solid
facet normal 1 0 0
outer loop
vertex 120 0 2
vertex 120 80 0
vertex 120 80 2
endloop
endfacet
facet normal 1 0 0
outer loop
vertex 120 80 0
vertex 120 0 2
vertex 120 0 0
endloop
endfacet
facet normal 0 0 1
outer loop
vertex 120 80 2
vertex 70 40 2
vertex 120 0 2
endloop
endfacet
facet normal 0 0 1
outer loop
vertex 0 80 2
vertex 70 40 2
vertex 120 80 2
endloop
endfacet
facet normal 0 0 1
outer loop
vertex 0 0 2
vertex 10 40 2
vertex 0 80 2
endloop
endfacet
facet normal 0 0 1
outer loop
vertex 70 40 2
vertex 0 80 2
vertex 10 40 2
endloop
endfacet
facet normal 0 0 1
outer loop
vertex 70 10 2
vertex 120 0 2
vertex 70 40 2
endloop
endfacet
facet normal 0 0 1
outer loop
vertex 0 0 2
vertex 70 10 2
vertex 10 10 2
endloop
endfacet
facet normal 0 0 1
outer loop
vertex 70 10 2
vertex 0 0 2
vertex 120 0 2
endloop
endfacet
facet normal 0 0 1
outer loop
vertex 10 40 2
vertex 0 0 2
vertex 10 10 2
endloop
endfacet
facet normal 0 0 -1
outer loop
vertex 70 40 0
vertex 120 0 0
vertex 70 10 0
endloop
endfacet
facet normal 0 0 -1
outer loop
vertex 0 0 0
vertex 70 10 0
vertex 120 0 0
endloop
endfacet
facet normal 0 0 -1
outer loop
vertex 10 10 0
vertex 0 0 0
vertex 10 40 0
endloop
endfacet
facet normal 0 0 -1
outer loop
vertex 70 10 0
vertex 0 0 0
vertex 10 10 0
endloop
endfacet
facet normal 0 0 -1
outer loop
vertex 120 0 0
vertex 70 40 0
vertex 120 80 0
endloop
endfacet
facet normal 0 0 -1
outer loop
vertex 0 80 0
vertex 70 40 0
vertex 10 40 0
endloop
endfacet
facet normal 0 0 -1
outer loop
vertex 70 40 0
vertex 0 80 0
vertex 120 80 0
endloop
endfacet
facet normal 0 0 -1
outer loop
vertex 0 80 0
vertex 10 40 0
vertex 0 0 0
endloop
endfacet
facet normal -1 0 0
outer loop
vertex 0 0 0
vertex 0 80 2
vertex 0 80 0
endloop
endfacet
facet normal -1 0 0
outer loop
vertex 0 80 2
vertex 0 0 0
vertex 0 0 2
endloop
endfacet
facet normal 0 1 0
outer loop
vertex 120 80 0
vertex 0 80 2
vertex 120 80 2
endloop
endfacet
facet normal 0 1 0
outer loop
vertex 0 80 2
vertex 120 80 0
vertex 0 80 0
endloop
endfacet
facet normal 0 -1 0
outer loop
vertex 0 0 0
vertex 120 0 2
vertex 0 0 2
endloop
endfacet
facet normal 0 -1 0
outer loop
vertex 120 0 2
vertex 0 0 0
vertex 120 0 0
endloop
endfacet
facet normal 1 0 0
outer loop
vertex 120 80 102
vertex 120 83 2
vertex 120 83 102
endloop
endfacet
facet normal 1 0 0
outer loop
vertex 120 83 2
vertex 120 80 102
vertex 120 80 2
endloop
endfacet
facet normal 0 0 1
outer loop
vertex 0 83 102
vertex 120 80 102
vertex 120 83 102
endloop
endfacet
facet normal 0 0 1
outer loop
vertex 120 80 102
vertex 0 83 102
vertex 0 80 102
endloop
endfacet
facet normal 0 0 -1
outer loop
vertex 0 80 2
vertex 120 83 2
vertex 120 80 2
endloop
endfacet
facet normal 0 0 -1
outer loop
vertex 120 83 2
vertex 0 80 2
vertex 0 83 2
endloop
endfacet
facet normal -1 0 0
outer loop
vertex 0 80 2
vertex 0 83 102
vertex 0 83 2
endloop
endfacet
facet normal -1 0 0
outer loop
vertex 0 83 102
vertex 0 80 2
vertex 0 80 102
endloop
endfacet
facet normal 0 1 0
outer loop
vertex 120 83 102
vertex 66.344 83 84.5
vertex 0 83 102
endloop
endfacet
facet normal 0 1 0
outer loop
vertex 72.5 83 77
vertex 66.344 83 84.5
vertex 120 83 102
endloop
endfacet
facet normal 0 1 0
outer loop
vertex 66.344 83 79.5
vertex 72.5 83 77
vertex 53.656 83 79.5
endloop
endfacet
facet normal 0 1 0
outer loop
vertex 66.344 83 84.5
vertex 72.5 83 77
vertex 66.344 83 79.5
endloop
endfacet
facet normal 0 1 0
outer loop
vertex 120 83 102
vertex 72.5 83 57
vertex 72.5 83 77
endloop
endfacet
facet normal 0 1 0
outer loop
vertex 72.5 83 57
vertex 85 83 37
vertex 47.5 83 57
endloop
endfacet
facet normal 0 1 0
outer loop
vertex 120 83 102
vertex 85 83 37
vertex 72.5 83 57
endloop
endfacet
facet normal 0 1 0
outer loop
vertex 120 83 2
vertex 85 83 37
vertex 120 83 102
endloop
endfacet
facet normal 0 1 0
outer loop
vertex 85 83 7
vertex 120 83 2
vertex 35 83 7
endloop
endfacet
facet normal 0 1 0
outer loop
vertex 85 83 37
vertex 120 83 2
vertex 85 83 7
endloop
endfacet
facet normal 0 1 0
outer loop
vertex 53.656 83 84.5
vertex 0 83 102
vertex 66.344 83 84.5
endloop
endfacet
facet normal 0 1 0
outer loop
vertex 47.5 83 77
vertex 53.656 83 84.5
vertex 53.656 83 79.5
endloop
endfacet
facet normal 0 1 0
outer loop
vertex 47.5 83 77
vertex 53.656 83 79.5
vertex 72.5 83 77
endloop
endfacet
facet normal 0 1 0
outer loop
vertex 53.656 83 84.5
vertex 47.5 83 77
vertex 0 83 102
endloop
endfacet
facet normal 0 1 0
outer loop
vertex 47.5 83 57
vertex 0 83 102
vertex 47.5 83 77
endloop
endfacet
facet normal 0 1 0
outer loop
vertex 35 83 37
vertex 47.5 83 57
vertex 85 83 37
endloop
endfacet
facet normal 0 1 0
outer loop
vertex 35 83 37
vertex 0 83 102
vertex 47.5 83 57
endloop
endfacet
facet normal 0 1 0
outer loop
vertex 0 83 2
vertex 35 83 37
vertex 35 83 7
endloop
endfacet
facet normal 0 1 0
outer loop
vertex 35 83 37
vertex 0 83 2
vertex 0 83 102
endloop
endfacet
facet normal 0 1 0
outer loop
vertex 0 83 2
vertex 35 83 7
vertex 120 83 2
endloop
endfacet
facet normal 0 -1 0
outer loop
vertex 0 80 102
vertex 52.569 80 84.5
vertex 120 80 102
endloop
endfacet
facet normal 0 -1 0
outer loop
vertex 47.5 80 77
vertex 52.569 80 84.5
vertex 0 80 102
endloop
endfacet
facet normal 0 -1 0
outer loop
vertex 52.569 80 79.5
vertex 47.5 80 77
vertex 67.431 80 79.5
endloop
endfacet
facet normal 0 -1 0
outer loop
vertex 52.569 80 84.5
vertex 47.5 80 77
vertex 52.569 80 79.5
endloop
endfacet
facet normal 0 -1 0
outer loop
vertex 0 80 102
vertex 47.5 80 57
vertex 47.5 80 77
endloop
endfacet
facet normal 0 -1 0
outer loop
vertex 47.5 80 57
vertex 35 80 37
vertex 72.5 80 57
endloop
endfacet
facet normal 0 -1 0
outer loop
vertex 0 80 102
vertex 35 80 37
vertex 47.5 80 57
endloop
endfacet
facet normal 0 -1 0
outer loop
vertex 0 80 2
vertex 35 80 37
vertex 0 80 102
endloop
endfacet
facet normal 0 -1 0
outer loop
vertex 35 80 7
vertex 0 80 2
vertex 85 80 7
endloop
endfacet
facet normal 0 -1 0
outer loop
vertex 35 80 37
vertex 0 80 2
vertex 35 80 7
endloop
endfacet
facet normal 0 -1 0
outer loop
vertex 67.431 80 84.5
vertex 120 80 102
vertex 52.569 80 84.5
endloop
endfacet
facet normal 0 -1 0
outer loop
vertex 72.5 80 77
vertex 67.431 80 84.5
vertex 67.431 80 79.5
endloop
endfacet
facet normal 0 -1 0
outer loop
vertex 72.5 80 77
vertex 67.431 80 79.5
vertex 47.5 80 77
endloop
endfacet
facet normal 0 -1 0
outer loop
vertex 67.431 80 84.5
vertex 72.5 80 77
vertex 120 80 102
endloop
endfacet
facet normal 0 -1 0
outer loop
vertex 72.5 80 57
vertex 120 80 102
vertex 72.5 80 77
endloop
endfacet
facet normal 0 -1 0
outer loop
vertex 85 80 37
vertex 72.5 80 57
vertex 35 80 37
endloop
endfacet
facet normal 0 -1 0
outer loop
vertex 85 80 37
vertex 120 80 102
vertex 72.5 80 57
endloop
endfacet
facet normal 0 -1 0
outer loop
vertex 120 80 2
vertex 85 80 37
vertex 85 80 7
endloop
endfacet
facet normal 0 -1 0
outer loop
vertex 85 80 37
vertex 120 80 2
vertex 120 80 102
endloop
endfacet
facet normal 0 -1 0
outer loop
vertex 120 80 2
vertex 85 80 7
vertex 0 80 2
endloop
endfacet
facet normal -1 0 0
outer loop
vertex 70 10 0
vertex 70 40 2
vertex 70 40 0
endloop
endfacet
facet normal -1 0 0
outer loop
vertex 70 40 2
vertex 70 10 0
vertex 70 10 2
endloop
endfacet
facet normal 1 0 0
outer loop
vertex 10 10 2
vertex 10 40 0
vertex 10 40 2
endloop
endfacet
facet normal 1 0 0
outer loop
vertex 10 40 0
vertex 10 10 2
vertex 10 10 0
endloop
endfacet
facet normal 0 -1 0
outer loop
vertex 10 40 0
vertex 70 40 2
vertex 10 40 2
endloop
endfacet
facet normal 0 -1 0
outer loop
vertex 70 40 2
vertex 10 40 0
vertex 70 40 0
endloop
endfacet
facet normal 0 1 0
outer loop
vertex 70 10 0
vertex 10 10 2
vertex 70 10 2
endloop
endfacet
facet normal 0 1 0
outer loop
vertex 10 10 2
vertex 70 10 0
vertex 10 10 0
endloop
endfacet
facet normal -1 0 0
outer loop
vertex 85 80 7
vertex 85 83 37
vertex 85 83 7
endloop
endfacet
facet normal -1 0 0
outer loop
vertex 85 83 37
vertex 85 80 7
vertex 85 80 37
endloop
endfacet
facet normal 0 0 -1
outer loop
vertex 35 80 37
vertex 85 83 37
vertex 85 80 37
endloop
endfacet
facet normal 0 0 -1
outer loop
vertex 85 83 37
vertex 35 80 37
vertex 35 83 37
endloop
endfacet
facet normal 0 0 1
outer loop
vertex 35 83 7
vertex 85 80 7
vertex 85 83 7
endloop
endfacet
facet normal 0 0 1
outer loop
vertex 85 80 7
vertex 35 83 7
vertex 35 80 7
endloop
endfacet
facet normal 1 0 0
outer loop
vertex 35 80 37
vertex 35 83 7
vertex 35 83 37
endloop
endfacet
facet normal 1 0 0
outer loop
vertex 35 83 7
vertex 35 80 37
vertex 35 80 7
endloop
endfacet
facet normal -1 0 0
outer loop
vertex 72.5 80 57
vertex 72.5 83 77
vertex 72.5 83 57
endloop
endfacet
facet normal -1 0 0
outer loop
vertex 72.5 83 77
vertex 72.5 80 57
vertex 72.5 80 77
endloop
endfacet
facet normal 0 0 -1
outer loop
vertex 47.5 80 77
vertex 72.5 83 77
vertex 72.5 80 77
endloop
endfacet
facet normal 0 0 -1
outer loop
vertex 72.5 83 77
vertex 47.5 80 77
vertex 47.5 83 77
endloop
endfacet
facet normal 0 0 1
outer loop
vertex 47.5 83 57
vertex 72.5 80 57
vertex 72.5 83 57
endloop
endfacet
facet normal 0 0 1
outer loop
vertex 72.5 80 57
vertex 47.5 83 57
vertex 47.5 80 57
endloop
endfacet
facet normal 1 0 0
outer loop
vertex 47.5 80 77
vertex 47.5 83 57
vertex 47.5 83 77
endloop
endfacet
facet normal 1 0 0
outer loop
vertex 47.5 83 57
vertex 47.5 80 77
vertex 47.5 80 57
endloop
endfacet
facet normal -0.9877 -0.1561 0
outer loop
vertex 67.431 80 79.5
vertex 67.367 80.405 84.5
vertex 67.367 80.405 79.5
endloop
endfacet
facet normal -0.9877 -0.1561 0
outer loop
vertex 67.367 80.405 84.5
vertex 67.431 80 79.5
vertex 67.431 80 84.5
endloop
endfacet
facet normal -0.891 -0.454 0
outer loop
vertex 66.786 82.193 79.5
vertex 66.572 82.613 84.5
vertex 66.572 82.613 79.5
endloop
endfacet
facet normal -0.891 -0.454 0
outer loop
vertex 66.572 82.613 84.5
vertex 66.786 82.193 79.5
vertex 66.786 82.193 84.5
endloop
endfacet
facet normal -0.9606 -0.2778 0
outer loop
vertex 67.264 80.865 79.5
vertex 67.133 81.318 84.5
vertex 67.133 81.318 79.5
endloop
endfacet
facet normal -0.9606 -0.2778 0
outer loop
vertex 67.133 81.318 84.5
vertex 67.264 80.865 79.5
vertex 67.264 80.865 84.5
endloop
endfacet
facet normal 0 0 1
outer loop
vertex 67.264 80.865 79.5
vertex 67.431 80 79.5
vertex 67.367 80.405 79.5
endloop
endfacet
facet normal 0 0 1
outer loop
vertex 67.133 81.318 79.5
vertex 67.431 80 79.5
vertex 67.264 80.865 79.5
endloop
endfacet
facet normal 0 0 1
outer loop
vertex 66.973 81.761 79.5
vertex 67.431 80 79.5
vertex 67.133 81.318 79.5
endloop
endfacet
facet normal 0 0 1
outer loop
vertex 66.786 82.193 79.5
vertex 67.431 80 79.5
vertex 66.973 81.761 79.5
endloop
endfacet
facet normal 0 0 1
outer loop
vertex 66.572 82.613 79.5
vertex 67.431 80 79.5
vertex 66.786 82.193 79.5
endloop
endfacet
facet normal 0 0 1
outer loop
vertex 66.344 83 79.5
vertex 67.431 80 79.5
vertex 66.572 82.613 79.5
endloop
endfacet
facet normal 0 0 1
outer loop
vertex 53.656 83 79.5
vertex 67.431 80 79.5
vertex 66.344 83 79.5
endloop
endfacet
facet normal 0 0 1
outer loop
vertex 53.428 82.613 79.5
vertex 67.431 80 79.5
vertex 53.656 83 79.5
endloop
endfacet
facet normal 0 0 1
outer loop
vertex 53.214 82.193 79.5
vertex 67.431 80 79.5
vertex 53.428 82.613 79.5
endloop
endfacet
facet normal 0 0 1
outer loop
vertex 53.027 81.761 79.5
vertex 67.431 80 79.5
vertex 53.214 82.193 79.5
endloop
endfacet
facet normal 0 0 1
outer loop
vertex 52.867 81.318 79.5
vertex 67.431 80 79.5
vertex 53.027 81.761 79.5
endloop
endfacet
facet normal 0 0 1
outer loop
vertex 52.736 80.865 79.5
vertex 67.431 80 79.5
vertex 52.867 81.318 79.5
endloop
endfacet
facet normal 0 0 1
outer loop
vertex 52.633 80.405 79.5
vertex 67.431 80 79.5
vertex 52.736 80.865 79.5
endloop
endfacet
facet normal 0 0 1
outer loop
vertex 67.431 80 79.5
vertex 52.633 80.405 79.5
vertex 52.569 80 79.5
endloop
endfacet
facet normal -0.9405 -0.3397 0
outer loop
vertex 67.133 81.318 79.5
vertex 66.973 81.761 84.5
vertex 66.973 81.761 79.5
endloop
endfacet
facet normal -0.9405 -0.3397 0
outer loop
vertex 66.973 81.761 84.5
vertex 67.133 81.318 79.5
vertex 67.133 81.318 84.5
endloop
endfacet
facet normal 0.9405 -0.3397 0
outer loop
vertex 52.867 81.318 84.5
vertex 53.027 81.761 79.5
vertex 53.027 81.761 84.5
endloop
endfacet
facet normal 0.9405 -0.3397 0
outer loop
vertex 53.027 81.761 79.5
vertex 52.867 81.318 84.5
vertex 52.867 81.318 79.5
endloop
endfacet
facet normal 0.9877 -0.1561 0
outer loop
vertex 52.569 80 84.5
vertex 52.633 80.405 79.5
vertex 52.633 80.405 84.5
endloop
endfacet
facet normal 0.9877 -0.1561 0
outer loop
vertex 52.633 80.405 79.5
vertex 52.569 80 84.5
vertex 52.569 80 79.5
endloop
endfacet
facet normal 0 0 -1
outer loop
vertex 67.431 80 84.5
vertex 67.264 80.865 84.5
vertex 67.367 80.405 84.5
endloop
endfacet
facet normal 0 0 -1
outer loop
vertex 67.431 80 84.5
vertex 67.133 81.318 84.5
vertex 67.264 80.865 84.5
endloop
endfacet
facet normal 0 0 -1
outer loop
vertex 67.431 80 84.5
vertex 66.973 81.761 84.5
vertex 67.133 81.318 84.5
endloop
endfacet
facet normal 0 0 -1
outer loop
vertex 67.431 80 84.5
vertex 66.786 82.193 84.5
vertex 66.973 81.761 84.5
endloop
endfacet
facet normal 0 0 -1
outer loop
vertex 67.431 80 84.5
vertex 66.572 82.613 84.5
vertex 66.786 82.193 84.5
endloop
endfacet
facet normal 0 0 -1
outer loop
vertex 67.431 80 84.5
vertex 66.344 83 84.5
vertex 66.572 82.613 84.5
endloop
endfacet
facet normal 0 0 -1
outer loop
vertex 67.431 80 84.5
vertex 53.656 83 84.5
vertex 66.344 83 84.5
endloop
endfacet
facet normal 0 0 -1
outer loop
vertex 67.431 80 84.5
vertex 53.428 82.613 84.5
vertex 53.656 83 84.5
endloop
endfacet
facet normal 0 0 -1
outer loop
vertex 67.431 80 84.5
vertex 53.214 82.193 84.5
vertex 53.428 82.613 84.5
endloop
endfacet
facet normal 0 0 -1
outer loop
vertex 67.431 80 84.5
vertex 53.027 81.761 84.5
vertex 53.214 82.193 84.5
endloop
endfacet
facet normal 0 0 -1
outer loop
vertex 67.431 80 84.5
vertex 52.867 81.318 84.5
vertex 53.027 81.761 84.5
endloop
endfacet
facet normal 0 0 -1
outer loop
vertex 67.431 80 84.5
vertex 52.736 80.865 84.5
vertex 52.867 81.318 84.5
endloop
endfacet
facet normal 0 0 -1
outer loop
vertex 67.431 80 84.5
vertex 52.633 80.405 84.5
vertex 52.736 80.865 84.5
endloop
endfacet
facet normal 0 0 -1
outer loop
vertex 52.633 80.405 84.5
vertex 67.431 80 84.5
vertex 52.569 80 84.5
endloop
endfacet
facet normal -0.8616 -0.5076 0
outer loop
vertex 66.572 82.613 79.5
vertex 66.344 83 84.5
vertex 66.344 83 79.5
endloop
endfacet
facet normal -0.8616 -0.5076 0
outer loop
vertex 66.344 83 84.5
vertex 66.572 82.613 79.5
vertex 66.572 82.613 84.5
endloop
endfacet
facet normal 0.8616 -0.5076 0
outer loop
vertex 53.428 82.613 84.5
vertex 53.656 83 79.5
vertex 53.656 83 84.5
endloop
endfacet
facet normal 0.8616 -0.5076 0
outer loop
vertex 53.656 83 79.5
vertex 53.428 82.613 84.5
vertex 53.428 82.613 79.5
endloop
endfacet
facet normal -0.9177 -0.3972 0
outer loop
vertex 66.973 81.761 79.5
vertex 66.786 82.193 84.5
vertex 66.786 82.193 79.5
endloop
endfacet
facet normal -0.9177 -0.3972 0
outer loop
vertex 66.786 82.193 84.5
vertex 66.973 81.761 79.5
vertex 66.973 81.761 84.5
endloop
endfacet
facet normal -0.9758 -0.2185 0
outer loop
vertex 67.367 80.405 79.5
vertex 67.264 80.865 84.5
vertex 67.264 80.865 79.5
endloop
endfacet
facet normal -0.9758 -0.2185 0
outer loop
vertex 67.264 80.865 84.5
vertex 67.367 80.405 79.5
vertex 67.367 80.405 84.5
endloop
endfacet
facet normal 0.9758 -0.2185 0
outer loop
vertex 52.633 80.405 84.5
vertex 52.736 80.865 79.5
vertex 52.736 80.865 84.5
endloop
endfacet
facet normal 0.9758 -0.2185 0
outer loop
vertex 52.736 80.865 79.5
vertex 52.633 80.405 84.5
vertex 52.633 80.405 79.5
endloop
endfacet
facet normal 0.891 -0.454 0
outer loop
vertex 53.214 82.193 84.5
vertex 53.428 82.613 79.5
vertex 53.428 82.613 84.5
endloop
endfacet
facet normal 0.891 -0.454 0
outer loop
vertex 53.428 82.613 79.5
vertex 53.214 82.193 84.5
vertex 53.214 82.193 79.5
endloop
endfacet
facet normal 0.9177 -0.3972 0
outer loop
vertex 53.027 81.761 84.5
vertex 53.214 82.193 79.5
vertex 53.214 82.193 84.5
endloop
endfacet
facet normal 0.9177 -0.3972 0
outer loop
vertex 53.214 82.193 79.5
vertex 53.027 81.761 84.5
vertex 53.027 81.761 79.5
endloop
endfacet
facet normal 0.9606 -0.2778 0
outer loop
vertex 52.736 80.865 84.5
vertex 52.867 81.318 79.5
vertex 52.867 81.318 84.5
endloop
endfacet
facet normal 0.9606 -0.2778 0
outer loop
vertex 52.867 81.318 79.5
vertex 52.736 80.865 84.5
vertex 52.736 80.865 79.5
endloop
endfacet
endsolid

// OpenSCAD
// ========================== PARAMETERS ==========================
// Base Sheet Dimensions (mm)
base_length = 120;    // X-axis length of base plate
base_width = 80;      // Y-axis width of base plate
base_thickness = 2;   // Z-axis thickness of base sheet

// Upright Wall Dimensions (mm)
wall_height = 100;    // Vertical height of wall above base top
wall_thickness = 3;   // Thickness of the upright wall

// Base Plate Cutout Dimensions (mm)
base_cut_x = 60;      // X size of base rectangular through cut
base_cut_y = 30;      // Y size of base rectangular through cut
base_cut_offset_x = 10; // X offset from left edge of base
base_cut_offset_y = 10; // Y offset from front edge of base

// Lower Wall Cutout Dimensions (mm)
lower_cut_width = 50;  // Horizontal width of lower wall opening
lower_cut_height = 30; // Vertical height of lower wall opening
lower_cut_gap = 5;     // Gap between base top and bottom of lower cut

// Upper Wall Cutout Dimensions (mm)
upper_cut_width = 25;  // Horizontal width of upper wall opening
upper_cut_height = 20; // Vertical height of upper wall opening
upper_cut_gap = 20;    // Gap between top of lower cut and bottom of upper cut

// Wall Round Hole Dimensions (mm)
hole_diameter = 15;    // Diameter of through hole in wall
hole_top_gap = 15;     // Gap between wall top and top edge of hole

// Global Curve Resolution
$fn = 100;

// ========================== MODULES ==========================
// Flat base plate module
module base_plate() {
    cube([base_length, base_width, base_thickness]);
}

// Full-length upright wall module (mounted along back edge of base)
module upright_wall() {
    translate([0, base_width, base_thickness])
        cube([base_length, wall_thickness, wall_height]);
}

// ========================== MAIN MODEL ==========================
difference() {
    // Union of base solid and wall solid
    union() {
        base_plate();
        upright_wall();
    }

    // 1. Through cutout in base plate
    translate([base_cut_offset_x, base_cut_offset_y, -1])
        cube([base_cut_x, base_cut_y, base_thickness + 2]);

    // 2. Lower rectangular through cut in wall
    translate([
        (base_length - lower_cut_width)/2, 
        base_width - 1, 
        base_thickness + lower_cut_gap
    ])
        cube([lower_cut_width, wall_thickness + 2, lower_cut_height]);

    // 3. Upper rectangular through cut in wall
    upper_cut_z_start = base_thickness + lower_cut_gap + lower_cut_height + upper_cut_gap;
    translate([
        (base_length - upper_cut_width)/2, 
        base_width - 1, 
        upper_cut_z_start
    ])
        cube([upper_cut_width, wall_thickness + 2, upper_cut_height]);

    // 4. Round through hole in upper section of wall
    hole_center_z = base_thickness + wall_height - hole_top_gap - (hole_diameter/2);
    translate([base_length/2, base_width - 1, hole_center_z])
        cylinder(h=wall_thickness + 2, d=hole_diameter);
}
